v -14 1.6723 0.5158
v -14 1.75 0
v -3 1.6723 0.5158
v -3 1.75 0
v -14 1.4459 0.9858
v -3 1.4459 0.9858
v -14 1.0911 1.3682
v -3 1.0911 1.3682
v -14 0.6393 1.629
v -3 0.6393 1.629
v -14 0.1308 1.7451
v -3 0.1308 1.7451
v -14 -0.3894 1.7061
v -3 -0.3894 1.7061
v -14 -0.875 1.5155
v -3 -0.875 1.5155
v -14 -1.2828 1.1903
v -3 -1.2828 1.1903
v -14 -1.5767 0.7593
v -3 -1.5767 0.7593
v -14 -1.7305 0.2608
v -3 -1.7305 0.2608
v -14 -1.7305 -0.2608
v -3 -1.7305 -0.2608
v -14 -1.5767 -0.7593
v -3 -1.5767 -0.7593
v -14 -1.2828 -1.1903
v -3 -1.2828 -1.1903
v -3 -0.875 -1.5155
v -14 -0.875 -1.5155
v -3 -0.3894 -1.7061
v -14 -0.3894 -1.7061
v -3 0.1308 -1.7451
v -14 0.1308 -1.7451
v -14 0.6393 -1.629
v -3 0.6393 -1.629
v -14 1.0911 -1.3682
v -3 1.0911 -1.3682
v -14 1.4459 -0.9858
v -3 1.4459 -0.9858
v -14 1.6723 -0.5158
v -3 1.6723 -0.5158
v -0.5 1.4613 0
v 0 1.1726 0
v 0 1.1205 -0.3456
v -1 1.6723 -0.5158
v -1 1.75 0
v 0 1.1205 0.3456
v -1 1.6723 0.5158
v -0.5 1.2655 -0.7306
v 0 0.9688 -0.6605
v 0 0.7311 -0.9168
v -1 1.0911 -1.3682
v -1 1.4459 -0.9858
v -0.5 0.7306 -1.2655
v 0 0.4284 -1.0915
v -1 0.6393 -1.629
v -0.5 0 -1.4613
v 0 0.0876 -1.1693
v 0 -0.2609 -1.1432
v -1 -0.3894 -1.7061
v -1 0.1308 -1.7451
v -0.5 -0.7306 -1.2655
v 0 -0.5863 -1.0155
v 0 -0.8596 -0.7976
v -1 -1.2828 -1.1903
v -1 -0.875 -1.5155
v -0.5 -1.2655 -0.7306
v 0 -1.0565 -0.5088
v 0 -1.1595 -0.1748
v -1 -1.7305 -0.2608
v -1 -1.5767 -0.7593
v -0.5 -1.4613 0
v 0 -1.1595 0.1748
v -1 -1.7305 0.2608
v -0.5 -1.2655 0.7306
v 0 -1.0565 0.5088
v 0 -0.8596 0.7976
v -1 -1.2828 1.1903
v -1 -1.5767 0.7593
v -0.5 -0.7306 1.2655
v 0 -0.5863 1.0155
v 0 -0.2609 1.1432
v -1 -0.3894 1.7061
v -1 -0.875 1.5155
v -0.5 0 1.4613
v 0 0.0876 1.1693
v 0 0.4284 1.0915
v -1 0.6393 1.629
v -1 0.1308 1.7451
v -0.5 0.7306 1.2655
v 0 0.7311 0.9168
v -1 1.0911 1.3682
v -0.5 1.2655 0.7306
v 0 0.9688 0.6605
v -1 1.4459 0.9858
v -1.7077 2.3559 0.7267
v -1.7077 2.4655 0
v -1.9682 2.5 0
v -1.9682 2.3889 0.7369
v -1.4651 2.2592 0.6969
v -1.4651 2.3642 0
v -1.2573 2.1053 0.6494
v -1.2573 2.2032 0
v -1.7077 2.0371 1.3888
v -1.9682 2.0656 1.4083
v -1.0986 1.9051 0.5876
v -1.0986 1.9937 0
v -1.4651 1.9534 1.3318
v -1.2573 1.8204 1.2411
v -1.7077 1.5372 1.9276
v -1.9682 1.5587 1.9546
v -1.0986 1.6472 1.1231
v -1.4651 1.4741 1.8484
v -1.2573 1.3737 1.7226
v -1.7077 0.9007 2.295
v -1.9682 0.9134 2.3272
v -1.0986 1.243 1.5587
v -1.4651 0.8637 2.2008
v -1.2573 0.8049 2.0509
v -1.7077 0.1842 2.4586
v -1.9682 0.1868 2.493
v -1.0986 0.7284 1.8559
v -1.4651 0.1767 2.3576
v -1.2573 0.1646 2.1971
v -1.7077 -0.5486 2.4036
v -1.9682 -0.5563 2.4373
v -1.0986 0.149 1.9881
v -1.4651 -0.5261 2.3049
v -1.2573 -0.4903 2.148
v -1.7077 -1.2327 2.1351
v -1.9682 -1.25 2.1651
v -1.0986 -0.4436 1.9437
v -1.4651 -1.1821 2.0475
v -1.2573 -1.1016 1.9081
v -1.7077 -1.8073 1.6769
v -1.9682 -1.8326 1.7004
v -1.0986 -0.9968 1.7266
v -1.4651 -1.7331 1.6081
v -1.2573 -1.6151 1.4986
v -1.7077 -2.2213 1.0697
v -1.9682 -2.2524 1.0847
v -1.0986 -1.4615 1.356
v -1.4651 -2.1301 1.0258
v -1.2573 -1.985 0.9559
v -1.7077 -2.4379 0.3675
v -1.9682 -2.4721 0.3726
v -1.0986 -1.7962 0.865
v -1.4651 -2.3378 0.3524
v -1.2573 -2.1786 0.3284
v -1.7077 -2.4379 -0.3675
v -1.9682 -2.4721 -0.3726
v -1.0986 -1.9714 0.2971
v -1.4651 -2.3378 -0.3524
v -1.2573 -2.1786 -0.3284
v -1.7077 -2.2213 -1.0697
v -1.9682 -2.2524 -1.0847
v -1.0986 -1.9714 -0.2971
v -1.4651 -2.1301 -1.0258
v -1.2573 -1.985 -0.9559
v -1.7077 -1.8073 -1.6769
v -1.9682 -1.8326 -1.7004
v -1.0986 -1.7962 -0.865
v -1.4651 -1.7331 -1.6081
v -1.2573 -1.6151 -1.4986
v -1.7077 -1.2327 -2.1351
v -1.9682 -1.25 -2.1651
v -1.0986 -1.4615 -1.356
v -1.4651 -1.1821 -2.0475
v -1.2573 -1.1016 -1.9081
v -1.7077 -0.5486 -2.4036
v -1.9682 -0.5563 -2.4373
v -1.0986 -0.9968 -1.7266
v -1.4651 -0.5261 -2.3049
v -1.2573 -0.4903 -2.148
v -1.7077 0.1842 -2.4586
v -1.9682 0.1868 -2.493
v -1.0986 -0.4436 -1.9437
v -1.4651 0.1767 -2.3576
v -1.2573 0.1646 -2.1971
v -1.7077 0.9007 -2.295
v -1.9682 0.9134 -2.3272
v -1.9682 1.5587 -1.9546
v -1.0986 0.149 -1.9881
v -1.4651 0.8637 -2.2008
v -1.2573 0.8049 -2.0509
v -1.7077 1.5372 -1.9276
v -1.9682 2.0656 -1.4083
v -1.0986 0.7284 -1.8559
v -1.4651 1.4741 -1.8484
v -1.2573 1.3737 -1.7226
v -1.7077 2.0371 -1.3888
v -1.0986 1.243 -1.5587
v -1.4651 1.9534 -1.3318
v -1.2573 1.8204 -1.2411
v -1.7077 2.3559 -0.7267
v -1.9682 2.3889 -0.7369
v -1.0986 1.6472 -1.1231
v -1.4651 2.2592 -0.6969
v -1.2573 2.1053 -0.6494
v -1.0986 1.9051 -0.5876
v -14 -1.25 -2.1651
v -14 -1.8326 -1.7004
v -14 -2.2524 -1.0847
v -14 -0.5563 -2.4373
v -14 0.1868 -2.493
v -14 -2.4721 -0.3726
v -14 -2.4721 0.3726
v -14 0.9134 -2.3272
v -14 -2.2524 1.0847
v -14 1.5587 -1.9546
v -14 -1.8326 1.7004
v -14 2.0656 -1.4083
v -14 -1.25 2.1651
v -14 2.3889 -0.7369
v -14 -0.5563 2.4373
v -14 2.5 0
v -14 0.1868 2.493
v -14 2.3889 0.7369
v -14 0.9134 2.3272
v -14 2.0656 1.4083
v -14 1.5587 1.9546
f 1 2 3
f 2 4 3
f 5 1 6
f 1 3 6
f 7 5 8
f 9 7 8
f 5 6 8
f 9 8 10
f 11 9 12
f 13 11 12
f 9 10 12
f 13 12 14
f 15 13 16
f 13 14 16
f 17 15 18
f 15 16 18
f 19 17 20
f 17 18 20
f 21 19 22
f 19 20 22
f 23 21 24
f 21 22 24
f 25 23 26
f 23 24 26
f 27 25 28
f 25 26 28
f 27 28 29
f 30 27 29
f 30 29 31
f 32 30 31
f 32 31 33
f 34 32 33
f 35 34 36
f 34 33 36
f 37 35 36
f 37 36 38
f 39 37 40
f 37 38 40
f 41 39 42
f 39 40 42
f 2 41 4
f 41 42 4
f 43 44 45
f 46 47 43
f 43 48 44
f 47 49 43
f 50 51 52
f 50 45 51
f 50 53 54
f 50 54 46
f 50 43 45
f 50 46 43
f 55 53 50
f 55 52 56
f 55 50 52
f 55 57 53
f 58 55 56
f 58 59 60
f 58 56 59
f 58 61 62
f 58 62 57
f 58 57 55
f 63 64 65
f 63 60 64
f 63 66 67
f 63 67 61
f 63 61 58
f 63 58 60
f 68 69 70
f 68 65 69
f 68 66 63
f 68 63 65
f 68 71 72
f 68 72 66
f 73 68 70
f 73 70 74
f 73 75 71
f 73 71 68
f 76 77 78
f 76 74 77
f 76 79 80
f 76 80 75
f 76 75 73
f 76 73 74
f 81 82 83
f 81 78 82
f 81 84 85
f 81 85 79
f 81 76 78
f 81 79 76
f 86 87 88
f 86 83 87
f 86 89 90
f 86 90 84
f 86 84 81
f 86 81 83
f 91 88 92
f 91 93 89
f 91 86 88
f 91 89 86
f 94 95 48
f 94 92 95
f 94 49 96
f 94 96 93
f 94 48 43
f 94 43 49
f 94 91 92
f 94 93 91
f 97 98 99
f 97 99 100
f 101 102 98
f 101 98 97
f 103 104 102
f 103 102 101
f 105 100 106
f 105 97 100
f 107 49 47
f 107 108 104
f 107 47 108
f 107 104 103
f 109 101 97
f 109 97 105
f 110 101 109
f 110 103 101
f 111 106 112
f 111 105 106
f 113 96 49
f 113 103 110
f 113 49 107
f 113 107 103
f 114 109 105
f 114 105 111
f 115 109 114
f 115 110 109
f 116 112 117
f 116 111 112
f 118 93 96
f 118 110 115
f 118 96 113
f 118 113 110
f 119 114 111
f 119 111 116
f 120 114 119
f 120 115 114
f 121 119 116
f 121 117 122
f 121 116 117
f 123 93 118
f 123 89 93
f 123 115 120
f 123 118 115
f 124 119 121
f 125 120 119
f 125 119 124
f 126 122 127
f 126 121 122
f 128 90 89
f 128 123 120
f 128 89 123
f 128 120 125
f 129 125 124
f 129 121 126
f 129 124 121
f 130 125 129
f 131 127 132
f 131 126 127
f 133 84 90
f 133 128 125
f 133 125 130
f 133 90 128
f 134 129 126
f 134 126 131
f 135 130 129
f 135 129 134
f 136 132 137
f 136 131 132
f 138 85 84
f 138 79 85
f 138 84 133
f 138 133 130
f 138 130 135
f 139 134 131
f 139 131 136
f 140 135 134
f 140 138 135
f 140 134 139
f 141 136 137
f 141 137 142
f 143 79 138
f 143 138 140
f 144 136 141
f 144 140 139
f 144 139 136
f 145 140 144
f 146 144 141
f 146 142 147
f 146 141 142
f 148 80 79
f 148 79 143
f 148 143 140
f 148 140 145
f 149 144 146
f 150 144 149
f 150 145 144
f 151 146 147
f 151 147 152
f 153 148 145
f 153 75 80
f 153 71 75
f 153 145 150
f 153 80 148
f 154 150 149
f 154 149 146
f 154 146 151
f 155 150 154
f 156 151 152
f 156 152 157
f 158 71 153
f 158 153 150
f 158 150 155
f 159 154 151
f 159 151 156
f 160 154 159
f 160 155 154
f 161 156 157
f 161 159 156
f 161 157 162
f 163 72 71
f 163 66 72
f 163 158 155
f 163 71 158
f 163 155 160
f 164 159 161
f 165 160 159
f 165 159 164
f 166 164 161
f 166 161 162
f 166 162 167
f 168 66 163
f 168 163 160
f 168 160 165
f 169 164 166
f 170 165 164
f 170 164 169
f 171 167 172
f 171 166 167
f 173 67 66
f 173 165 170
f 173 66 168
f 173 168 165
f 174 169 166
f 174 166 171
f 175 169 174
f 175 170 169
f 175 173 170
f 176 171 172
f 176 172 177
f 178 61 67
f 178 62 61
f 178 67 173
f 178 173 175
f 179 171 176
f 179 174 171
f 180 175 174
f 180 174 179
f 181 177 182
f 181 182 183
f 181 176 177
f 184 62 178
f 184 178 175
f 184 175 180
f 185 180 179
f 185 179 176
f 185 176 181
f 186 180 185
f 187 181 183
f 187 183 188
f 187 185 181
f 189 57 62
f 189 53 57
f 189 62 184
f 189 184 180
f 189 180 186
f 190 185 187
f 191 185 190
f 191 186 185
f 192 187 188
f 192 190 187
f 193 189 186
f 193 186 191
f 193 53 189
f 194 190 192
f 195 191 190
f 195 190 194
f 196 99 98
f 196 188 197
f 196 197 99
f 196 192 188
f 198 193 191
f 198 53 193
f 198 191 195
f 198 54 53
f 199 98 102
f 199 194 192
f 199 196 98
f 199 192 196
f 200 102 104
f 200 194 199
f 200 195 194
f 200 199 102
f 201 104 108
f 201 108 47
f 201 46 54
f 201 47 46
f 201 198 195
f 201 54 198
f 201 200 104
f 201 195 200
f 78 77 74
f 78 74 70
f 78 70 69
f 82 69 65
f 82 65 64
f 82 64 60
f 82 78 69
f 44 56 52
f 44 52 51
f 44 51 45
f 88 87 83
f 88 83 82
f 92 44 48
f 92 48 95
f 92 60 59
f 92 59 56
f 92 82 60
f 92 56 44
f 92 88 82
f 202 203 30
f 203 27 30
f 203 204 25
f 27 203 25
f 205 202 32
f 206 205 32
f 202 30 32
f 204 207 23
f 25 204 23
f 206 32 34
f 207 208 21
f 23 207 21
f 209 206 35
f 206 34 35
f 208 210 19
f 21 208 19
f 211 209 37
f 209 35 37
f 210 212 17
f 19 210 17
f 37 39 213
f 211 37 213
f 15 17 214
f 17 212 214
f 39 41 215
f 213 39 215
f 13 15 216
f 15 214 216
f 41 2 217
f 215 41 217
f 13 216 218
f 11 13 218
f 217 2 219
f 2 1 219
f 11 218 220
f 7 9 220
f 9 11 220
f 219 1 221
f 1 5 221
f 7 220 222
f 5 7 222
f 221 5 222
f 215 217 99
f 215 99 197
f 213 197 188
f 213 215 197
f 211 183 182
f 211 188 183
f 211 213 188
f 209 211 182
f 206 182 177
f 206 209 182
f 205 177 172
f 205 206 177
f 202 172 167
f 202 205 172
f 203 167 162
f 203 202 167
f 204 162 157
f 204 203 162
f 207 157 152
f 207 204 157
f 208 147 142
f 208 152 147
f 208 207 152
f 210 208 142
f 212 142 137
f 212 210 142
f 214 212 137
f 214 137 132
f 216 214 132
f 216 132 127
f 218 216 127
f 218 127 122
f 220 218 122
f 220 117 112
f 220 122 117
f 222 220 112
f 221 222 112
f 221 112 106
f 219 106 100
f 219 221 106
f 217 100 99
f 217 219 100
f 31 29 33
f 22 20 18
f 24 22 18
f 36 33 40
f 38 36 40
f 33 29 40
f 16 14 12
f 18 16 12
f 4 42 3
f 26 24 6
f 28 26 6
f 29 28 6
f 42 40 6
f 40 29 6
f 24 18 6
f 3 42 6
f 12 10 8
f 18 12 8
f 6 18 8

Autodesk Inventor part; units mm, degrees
ref_plane "YZ Plane" through (0, 0, 0) normal (1, 0, 0) x (0, 1, 0)
ref_plane "XZ Plane" through (0, 0, 0) normal (0, 1, 0) x (-1, 0, 0)
ref_plane "XY Plane" through (0, 0, 0) normal (0, 0, 1) x (1, 0, 0)
sketch "Sketch1" plane through (0, 0, 0) normal (0, 0, 1) x (1, 0, 0)
  line L0 (-16.8, 0) -> (2.8, 0) construction
  line L1 (0, -0.5) -> (0, 3) construction
  line L2 (0, 0) -> (0, 1.1726)
  line L3 (-1, 2.5) -> (-14, 2.5)
  line L4 (-14, 2.5) -> (-14, 1.75)
  line L5 (-14, 1.75) -> (-3, 1.75)
  line L6 (-3, 1.75) -> (-3, 0)
  line L7 (-3, 0) -> (0, 0)
  line L8 (-1, 2.5) -> (-1, 1.75)
  line L9 (-1, 1.75) -> (0, 1.1726)
  dimension "d0" = 5
  dimension "d1" = 3.5
  dimension "d3" = 14
  dimension "d6" = 2
  dimension "d7" = 60
  dimension "d9" = 1
revolve "Revolution1" add sketch "Sketch1" angle 360 about axis through (-10, 0, 0) along (1, 0, 0)
fillet "Fillet2" radius 1 1 edges at (-1, -2.5, 0)
properties part number "P110" material "ABS Plastic"
